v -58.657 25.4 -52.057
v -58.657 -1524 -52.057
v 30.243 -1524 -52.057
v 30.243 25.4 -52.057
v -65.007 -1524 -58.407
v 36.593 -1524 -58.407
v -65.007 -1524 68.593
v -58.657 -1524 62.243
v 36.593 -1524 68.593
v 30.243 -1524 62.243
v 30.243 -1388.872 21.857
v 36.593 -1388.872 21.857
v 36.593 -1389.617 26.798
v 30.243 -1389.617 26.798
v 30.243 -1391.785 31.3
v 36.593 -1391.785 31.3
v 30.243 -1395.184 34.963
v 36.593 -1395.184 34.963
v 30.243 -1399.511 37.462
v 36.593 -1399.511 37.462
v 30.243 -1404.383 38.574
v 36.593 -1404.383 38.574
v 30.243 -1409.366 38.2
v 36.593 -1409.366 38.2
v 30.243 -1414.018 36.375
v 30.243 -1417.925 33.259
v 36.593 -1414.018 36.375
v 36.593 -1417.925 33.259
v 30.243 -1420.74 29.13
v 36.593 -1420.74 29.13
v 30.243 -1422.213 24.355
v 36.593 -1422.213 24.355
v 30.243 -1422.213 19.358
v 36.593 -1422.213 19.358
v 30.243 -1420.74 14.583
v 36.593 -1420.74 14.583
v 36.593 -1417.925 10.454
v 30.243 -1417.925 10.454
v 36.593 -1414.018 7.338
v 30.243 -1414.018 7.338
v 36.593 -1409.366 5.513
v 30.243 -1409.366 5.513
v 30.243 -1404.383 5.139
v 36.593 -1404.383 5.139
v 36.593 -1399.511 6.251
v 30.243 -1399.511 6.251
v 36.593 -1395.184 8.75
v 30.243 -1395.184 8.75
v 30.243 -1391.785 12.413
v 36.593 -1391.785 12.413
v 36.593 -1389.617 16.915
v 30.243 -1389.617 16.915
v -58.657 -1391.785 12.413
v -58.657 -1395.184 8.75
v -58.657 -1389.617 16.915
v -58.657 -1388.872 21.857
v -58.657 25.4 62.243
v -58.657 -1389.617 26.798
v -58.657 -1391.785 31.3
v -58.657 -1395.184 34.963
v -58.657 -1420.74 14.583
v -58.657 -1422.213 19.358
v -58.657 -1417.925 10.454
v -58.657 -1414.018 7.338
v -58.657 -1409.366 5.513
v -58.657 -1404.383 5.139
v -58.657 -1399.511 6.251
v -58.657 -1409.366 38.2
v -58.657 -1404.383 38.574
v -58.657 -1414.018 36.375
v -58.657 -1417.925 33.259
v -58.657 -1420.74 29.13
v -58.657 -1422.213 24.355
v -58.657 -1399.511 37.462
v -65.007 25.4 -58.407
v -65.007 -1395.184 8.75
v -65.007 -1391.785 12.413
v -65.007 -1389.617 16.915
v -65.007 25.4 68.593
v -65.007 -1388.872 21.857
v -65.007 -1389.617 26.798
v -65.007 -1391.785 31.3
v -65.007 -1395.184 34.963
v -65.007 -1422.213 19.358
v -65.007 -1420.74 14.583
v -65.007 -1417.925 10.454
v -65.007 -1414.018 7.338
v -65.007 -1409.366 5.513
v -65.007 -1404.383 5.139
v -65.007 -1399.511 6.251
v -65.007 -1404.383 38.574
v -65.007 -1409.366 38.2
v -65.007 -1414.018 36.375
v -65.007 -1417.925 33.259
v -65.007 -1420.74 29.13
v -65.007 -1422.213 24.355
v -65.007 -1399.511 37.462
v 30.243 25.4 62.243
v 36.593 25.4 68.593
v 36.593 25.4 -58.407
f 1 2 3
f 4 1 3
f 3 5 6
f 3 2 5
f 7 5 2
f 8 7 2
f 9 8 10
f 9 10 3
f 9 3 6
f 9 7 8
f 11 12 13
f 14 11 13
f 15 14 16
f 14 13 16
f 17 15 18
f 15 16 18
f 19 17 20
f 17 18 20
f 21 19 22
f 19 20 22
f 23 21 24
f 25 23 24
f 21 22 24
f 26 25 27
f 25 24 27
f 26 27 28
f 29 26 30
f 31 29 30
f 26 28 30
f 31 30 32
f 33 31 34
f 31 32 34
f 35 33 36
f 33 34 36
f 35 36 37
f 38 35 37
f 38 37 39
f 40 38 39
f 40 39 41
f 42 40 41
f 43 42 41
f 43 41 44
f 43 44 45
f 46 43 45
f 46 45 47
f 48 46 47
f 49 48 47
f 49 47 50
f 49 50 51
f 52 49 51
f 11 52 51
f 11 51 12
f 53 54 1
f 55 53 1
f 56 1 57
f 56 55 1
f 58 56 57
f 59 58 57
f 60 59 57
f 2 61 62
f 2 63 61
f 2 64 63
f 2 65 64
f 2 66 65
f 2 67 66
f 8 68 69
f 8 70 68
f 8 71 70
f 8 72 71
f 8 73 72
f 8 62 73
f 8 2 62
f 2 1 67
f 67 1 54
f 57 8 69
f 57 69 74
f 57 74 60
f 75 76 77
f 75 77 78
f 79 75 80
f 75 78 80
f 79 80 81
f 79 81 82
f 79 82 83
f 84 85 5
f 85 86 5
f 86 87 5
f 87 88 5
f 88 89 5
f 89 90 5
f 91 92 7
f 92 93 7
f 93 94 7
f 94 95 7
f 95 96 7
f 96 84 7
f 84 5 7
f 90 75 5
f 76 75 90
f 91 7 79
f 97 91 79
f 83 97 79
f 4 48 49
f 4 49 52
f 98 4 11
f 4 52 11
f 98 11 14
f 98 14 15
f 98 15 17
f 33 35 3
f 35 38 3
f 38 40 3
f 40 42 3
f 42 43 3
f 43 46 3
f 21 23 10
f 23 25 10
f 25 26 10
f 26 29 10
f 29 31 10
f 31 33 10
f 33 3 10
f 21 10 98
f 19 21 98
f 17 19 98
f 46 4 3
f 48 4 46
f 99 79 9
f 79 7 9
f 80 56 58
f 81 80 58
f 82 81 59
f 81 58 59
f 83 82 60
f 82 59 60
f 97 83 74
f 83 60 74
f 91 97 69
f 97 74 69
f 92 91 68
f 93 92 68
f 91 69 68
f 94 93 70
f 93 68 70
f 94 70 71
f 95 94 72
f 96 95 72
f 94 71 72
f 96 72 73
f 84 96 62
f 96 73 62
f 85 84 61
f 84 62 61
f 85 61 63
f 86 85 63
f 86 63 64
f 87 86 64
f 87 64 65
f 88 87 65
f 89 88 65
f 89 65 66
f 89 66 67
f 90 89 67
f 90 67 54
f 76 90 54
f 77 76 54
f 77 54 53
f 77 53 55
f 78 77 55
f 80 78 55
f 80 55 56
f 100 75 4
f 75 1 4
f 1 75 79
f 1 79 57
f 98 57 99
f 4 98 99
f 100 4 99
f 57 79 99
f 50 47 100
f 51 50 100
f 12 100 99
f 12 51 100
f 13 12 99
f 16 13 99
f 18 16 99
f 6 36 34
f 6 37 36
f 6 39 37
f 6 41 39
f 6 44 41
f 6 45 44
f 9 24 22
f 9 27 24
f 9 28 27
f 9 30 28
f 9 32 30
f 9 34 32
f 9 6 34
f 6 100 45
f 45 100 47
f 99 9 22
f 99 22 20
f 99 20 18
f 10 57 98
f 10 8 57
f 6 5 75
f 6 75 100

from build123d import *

# Parameters (mm, degrees)
F0_W          = 101.6
F0_H          = 127
F0_W_2        = 88.9
F0_H_2        = 114.3
F1_DEPTH      = 1524
F1_DEPTH_BACK = 25.4
F2_R          = 16.764
F3_DEPTH      = 127


# Not quite as in the source:
# - a feature names something its author has since deleted; it is built from what else it names


with BuildPart() as f1:
    # F0 (on Front) → F1 (new body, two sides)
    with BuildSketch(Plane.XZ) as f1_sk:
        with Locations((-14.2066246522, 5.0925366492)):
            Rectangle(F0_W, F0_H)
        with Locations((-14.2066246522, 5.0925366492)):
            Rectangle(F0_W_2, F0_H_2, mode=Mode.SUBTRACT)
    extrude(amount=F1_DEPTH)
    extrude(f1_sk.sketch, amount=-F1_DEPTH_BACK)

    # F2 (on face) → F3 (cut)
    with BuildSketch(Plane.YZ.offset(36.5933753478)):
        with Locations((-1405.636, 21.8565366492)):
            Circle(F2_R)
    extrude(amount=-F3_DEPTH, mode=Mode.SUBTRACT)


solid = f1.part
